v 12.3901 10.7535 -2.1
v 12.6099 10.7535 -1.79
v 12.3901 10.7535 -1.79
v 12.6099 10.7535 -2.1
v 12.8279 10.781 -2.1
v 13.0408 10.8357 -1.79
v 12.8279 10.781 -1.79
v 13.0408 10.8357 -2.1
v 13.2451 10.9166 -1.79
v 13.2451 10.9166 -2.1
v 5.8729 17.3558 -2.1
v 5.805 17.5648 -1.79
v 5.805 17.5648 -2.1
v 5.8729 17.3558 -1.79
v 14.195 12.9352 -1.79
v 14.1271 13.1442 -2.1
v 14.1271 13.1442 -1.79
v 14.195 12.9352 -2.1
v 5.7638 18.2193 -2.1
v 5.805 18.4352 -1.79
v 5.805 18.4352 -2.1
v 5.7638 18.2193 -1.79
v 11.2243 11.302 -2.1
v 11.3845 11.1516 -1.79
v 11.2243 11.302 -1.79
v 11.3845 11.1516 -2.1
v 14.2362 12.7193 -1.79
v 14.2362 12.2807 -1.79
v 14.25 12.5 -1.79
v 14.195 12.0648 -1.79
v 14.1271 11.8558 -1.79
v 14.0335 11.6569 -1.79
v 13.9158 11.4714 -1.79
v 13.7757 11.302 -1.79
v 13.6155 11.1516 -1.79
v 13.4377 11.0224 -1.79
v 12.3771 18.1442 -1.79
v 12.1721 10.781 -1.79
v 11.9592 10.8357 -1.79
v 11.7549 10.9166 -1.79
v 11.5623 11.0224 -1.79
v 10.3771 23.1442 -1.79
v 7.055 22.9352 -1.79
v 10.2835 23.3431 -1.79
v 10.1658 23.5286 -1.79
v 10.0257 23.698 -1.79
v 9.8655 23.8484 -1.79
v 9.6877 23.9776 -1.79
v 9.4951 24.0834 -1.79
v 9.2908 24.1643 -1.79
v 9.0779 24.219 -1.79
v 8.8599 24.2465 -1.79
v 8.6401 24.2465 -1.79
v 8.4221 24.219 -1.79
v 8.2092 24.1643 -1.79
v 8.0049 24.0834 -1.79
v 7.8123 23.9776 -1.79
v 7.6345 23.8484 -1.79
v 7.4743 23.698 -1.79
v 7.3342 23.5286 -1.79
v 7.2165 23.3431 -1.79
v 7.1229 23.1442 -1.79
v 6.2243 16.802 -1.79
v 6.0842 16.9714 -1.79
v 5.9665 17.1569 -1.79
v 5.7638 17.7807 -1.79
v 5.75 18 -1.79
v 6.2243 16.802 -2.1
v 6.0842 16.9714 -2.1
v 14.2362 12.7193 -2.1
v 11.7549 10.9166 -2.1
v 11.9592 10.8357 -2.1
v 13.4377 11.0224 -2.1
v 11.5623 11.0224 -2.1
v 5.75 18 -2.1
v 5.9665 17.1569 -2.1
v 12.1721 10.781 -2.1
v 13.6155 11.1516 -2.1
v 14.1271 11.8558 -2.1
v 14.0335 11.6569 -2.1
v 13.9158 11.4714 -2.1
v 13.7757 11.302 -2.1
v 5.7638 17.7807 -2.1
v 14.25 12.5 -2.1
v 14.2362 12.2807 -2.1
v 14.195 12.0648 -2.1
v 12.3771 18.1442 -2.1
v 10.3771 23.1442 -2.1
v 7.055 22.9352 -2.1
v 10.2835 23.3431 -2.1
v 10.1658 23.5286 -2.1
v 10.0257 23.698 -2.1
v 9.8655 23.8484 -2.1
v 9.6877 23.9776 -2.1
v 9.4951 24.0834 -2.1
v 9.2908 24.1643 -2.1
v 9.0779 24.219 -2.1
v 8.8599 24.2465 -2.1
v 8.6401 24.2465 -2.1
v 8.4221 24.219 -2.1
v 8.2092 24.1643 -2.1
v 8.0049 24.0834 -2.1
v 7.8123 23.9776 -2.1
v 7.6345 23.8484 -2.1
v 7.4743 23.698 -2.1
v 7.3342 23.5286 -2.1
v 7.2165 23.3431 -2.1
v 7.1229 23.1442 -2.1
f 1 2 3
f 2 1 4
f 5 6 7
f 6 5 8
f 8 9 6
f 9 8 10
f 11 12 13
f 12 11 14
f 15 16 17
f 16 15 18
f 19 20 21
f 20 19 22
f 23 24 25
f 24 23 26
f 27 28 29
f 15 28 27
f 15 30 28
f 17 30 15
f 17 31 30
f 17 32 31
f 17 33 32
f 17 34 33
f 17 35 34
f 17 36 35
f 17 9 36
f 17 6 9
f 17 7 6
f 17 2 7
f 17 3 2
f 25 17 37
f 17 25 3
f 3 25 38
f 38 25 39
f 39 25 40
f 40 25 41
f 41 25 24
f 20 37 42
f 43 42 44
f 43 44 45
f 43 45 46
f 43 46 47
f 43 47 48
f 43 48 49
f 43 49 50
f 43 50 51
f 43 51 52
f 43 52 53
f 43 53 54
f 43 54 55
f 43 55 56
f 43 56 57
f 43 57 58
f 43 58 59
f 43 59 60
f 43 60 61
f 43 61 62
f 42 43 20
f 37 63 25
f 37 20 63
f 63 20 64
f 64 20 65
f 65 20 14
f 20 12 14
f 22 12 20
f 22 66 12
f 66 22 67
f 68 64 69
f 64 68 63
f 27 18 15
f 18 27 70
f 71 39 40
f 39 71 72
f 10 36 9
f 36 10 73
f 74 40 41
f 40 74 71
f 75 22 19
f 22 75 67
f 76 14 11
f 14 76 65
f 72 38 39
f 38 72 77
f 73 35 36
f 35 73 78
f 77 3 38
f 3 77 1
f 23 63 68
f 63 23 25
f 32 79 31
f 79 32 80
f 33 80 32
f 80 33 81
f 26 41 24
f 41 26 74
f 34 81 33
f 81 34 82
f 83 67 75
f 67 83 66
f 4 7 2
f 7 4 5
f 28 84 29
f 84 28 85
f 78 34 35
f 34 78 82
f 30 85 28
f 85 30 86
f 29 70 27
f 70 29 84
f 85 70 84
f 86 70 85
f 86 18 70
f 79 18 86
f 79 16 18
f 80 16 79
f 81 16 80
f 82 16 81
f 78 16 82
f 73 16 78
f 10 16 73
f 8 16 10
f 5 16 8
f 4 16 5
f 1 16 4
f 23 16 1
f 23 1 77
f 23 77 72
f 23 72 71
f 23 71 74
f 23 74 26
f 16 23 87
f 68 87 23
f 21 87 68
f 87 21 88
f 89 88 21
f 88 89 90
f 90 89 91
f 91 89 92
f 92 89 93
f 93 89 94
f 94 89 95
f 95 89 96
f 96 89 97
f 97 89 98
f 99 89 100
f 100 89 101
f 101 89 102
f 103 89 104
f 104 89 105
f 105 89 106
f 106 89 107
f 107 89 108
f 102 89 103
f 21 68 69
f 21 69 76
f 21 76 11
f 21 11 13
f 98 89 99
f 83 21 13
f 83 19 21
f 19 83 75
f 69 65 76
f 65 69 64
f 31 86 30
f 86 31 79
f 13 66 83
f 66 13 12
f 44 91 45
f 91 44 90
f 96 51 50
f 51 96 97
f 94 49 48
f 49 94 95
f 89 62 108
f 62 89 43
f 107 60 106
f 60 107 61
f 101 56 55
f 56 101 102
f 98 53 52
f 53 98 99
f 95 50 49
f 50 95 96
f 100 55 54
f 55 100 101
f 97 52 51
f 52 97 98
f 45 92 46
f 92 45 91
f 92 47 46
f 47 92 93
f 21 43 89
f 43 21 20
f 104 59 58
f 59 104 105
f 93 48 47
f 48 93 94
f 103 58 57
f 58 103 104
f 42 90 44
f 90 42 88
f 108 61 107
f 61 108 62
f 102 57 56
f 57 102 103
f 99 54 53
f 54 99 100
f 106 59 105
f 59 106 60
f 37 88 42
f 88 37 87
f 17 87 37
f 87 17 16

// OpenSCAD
// file: rounded_poly.scad
// Function to create a cylinder extruded from point1 to point2 on the horizontal plane
// The cylinder is vertical at point1 and dragged to point2, filling the space between
// Parameters:
//   point1: [x, y] - Starting point on the horizontal plane
//   point2: [x, y] - Ending point on the horizontal plane
//   radius: Radius of the cylinder
//   height: Vertical height of the cylinder

module cylinder_between_points(point1, point2, radius=1, height=10) {
    // Use hull to fill the space between two vertical cylinders
    hull() {
        // Cylinder at point1
        translate([point1[0], point1[1], 0])
            cylinder(r=radius, h=height, center=false, $fn=50);
        
        // Cylinder at point2
        translate([point2[0], point2[1], 0])
            cylinder(r=radius, h=height, center=false, $fn=50);
    }
}

// Example usage:
// Create a cylinder from point [0, 0] to point [10, 5]
// cylinder_between_points([0, 0], [10, 5], radius=0.5, height=20);

// Function to create cylinders along a sequence of points
// Parameters:
//   points: Array of [x, y] coordinates
//   radius: Radius of the cylinders
//   height: Vertical height of the cylinders
//   fill_polygon: If true, also creates an extruded polygon through all points

module cylinder_path(points, radius=1, height=10, fill_polygon=false) {
    union() {
        // Loop through each consecutive pair of points
        for (i = [0 : len(points) - 2]) {
            cylinder_between_points(points[i], points[i+1], radius, height);
        }
        
        // If fill_polygon is true, close the path and create an extruded polygon
        if (fill_polygon) {
            // Close the path by connecting last point to first point
            cylinder_between_points(points[len(points)-1], points[0], radius, height);
            
            // Create the filled polygon
            linear_extrude(height=height)
                polygon(points);
        }
    }
}

// Example usage of cylinder_path:
// Create a path through multiple points
// cylinder_path([[0, 0], [10, 5], [15, 15], [5, 20]], radius=0.5, height=10, fill_polygon=true);

// Additional examples (commented out):
// cylinder_between_points([5, 5], [15, 10], radius=1, height=15);
// cylinder_between_points([-5, -5], [5, 5], radius=0.75, height=25);
// main file
// Import the rounded_poly module
use <rounded_poly.scad>
$fn=128;

module elec_backplate_mask()
{
    translate([0,0,-2.1]) color("green") union() {
        cylinder_between_points([7.5, 18.0], [12.5, 12.5], radius=1.75, height=0.31);
        cylinder_between_points([7.5, 18.0], [8.75, 22.5], radius=1.75, height=0.31);
        cylinder_between_points([8.75, 22.5], [10.75, 17.5], radius=1.75, height=0.31);
        cylinder_between_points([10.75, 17.5], [12.5, 12.5], radius=1.75, height=0.31);
    }
}

elec_backplate_mask();
